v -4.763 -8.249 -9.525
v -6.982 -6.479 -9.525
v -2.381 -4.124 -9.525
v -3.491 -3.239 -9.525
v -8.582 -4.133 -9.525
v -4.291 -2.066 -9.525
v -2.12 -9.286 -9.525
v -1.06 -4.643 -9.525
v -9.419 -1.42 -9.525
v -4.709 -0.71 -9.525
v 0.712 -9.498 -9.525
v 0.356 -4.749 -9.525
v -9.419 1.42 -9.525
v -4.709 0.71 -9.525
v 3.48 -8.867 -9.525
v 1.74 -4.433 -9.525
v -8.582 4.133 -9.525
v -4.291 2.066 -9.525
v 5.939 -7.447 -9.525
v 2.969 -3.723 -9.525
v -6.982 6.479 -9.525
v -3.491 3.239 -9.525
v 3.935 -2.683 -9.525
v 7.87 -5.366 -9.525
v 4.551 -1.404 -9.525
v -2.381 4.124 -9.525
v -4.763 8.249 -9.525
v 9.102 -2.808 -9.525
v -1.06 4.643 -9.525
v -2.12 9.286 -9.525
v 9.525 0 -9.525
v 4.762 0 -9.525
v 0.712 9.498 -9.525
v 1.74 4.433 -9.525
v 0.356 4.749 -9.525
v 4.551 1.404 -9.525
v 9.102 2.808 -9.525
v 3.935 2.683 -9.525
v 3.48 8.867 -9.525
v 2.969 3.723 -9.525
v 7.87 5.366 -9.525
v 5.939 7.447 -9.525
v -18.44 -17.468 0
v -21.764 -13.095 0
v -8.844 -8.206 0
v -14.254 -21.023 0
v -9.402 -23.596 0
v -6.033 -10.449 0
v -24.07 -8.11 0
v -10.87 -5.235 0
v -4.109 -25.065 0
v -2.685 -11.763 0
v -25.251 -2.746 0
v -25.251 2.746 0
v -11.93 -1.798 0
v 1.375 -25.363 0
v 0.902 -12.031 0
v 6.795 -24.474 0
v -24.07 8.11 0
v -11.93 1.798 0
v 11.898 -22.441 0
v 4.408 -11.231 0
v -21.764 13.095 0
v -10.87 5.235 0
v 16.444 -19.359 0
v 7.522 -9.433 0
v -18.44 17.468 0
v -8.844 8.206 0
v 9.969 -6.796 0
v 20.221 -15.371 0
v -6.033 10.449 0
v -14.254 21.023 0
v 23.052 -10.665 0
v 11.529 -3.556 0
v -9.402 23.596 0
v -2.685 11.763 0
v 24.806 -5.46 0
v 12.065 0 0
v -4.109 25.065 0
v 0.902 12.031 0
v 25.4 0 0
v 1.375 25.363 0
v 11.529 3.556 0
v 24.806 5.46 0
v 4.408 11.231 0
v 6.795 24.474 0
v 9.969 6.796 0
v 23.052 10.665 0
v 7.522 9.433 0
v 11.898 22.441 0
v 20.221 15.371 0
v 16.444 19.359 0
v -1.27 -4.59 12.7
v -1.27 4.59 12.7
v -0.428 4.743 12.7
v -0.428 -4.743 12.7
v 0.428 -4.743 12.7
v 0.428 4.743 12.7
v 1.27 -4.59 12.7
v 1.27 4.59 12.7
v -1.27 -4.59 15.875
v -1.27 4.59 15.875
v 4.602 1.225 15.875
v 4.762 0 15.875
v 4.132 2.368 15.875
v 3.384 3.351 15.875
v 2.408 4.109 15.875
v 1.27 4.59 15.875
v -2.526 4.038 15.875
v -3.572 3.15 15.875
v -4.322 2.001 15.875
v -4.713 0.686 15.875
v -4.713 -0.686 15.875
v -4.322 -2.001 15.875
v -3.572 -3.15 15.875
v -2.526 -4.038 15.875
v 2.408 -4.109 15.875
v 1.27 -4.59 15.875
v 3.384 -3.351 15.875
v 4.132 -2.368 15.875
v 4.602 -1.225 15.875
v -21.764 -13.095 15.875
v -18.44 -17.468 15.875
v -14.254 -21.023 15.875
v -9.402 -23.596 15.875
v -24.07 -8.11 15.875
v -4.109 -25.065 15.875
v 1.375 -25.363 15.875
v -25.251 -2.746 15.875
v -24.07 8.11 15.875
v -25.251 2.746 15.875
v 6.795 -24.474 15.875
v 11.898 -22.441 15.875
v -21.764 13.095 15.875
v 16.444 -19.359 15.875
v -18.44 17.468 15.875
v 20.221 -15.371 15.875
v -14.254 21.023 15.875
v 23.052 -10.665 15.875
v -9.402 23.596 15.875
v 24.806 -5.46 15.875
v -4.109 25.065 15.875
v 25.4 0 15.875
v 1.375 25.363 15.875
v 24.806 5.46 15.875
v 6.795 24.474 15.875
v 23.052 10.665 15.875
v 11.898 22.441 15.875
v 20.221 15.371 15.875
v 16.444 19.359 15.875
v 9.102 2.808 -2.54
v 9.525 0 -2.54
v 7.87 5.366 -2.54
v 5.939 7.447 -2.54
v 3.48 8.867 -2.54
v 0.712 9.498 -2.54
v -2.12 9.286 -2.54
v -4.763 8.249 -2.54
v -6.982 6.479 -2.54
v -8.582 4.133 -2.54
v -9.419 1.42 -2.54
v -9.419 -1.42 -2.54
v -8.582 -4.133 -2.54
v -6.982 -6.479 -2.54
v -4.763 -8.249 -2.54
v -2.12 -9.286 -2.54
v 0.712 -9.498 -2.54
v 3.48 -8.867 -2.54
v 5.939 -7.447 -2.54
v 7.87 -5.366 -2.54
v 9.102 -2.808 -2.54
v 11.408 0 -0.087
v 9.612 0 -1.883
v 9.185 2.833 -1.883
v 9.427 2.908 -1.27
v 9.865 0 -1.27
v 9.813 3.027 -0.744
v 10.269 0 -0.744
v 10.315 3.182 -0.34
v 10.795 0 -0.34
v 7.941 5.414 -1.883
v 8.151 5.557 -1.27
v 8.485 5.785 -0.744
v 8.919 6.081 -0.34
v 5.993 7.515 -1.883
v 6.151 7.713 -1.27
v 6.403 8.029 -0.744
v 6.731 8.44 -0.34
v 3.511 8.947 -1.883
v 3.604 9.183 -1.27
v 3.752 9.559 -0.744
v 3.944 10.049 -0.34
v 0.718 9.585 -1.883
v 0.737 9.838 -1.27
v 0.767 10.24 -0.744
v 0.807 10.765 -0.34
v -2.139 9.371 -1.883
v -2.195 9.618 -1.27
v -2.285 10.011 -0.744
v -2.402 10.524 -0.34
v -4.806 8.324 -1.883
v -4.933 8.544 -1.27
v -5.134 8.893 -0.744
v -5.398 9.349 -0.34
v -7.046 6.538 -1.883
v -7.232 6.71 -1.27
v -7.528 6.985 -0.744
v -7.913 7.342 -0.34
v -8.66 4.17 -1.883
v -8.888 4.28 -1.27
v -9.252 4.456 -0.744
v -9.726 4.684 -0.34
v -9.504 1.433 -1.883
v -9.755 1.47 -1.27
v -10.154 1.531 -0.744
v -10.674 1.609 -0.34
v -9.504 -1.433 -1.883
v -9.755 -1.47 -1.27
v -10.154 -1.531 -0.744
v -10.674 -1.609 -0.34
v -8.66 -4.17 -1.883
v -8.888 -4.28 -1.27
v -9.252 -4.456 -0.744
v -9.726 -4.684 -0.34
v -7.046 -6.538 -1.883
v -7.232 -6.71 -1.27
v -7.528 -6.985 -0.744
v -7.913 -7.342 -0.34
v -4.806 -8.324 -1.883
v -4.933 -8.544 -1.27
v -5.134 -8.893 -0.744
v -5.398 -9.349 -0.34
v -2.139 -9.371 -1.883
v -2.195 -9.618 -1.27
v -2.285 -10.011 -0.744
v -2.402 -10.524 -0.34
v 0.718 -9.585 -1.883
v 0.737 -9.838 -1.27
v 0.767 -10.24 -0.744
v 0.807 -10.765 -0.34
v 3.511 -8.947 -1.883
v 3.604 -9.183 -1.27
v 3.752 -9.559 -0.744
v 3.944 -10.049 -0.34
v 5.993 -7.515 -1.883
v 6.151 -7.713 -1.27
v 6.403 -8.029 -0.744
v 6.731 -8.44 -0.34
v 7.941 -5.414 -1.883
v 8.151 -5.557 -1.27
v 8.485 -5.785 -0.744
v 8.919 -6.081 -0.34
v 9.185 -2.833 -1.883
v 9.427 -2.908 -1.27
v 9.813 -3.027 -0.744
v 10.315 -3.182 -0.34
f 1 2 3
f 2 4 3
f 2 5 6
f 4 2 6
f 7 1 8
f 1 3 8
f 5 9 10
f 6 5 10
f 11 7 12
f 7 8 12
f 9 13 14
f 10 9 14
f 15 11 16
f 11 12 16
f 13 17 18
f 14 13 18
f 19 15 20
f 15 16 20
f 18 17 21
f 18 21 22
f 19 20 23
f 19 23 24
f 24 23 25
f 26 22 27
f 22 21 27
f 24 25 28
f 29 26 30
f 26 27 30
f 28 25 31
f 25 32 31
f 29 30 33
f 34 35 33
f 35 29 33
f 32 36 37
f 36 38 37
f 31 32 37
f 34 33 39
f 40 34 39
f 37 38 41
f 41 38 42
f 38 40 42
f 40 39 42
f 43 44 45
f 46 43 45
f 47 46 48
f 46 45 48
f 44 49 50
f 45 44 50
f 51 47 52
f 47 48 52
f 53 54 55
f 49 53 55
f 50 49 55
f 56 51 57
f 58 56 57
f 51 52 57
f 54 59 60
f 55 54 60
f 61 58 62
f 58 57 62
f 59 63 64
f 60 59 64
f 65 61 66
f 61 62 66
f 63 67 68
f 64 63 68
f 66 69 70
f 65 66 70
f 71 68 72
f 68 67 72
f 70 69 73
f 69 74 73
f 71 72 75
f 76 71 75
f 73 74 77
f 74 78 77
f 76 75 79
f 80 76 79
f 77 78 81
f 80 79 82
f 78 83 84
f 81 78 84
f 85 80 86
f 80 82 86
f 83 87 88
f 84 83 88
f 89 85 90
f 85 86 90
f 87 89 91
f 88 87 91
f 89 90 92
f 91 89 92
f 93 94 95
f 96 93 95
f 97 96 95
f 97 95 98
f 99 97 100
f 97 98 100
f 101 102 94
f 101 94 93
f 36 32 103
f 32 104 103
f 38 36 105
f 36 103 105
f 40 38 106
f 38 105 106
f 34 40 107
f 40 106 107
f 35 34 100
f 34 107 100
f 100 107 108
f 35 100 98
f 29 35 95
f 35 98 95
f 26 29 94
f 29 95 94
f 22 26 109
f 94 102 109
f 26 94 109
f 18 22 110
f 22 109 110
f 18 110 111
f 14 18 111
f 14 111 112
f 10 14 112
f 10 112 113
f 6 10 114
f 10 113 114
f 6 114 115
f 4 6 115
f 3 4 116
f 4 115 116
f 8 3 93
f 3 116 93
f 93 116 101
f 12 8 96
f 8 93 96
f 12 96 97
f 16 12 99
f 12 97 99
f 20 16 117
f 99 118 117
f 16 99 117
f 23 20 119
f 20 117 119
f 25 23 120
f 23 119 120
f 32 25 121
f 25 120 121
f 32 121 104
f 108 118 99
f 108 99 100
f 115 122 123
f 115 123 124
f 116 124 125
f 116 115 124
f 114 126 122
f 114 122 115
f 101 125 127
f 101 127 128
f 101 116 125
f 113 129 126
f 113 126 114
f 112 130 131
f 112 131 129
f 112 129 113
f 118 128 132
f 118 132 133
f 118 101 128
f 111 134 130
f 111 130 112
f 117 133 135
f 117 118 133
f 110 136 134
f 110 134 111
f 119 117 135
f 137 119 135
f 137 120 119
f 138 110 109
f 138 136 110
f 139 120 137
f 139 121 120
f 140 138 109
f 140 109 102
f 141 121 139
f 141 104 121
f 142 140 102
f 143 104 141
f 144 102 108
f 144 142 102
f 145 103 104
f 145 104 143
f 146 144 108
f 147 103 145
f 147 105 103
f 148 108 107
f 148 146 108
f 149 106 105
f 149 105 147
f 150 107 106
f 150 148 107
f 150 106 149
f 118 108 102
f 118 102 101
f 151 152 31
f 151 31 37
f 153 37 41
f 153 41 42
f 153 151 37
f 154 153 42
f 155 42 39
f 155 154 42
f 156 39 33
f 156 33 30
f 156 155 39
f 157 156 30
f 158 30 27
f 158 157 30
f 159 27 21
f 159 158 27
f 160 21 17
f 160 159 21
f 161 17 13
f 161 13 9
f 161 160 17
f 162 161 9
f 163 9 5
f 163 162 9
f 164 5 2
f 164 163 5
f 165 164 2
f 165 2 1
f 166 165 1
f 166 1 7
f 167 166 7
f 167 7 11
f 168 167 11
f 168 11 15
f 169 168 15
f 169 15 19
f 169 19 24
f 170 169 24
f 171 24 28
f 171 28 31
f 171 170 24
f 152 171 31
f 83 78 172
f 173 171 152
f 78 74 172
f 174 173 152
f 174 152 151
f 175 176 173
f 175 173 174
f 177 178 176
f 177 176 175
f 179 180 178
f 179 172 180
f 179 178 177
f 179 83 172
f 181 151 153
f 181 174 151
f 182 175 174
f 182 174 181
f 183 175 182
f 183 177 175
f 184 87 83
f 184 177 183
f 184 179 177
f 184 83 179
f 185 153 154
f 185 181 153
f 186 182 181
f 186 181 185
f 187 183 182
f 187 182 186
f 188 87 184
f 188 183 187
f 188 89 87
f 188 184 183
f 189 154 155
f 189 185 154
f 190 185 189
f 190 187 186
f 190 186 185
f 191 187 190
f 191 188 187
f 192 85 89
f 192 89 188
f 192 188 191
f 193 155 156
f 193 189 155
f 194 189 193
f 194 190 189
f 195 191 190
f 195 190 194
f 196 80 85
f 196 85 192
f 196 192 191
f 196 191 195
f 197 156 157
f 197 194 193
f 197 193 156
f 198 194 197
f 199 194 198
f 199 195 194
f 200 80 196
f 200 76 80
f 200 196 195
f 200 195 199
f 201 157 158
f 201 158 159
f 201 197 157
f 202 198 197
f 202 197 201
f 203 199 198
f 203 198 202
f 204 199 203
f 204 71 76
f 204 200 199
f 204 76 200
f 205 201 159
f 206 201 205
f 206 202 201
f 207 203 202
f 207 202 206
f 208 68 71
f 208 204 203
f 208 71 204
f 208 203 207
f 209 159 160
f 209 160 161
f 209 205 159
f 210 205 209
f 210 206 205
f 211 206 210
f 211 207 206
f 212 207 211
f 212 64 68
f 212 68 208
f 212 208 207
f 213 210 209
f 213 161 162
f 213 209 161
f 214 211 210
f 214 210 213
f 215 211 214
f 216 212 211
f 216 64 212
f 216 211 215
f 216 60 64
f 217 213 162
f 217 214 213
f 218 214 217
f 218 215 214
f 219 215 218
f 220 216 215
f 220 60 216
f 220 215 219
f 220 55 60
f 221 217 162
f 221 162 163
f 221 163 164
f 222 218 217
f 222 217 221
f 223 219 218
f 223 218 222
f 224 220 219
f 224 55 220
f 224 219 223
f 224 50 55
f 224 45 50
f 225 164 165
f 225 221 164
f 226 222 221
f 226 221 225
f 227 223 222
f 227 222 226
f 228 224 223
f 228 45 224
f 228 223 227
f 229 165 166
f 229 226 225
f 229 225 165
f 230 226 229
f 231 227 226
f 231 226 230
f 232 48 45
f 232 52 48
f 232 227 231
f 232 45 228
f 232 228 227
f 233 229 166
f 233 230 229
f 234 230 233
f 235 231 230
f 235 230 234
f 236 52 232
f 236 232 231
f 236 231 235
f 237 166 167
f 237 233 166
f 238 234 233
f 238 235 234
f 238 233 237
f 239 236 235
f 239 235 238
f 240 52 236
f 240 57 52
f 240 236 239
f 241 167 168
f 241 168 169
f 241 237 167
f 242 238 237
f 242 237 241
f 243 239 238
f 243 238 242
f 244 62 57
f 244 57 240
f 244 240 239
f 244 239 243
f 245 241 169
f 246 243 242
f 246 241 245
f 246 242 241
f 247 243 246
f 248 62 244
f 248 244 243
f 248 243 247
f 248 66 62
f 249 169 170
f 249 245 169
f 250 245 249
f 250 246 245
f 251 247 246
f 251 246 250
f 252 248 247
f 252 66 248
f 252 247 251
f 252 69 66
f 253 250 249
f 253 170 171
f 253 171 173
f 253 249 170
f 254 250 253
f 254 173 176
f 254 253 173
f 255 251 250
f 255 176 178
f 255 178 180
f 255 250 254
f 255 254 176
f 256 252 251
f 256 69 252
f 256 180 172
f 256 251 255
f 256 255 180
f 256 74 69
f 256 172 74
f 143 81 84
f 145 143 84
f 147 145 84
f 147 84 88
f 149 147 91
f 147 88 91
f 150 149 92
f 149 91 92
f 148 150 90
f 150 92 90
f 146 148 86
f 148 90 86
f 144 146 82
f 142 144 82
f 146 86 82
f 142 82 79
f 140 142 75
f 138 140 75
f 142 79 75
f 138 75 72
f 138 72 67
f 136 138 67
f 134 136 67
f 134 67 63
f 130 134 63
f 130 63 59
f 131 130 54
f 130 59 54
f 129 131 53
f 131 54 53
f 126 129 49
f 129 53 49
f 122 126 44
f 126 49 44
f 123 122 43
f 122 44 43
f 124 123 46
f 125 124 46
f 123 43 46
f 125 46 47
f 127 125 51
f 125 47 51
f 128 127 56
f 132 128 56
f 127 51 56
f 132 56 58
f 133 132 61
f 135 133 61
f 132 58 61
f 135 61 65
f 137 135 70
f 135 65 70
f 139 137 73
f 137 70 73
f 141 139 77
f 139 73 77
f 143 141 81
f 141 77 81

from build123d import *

# Parameters (mm, degrees)
SKETCH1_R           = 25.4
SKETCH1_R_2         = 4.7625
BOSS_EXTRUDE1_DEPTH = 15.875
BOSS_EXTRUDE2_START = -9.525
SKETCH1_3_R         = 9.525
SKETCH1_3_R_2       = 4.7625
BOSS_EXTRUDE2_DEPTH = 9.525
FILLET1_R           = 2.54
BOSS_EXTRUDE3_START = -3.175
BOSS_EXTRUDE3_DEPTH = 3.175


with BuildPart() as part:
    # Sketch1 → Boss-Extrude1 (new body)
    with BuildSketch(Plane.XY):
        Circle(SKETCH1_R)
        Circle(SKETCH1_R_2, mode=Mode.SUBTRACT)
    extrude(amount=BOSS_EXTRUDE1_DEPTH)

    # Sketch1<3> → Boss-Extrude2 (add)
    with BuildSketch(Plane.XY.offset(BOSS_EXTRUDE2_START)):
        Circle(SKETCH1_3_R)
        Circle(SKETCH1_3_R_2, mode=Mode.SUBTRACT)
    extrude(amount=BOSS_EXTRUDE2_DEPTH)

    # Fillet1
    fillet1_edges = [part.edges().sort_by_distance(p)[0] for p in [
        (-9.525, 0, 0),
    ]]
    fillet(fillet1_edges, radius=FILLET1_R)

    # Sketch2 → Boss-Extrude3 (add)
    with BuildSketch(Plane.XY.offset(15.875).offset(BOSS_EXTRUDE3_START)):
        with BuildLine():
            Line((-1.27, 4.590044254), (-1.27, -4.590044254))
            ThreePointArc((-1.27, -4.590044254), (0, -4.7625), (1.27, -4.590044254))
            Line((1.27, -4.590044254), (1.27, 4.590044254))
            ThreePointArc((1.27, 4.590044254), (0, 4.7625), (-1.27, 4.590044254))
        make_face()
    extrude(amount=BOSS_EXTRUDE3_DEPTH)


solid = part.part
